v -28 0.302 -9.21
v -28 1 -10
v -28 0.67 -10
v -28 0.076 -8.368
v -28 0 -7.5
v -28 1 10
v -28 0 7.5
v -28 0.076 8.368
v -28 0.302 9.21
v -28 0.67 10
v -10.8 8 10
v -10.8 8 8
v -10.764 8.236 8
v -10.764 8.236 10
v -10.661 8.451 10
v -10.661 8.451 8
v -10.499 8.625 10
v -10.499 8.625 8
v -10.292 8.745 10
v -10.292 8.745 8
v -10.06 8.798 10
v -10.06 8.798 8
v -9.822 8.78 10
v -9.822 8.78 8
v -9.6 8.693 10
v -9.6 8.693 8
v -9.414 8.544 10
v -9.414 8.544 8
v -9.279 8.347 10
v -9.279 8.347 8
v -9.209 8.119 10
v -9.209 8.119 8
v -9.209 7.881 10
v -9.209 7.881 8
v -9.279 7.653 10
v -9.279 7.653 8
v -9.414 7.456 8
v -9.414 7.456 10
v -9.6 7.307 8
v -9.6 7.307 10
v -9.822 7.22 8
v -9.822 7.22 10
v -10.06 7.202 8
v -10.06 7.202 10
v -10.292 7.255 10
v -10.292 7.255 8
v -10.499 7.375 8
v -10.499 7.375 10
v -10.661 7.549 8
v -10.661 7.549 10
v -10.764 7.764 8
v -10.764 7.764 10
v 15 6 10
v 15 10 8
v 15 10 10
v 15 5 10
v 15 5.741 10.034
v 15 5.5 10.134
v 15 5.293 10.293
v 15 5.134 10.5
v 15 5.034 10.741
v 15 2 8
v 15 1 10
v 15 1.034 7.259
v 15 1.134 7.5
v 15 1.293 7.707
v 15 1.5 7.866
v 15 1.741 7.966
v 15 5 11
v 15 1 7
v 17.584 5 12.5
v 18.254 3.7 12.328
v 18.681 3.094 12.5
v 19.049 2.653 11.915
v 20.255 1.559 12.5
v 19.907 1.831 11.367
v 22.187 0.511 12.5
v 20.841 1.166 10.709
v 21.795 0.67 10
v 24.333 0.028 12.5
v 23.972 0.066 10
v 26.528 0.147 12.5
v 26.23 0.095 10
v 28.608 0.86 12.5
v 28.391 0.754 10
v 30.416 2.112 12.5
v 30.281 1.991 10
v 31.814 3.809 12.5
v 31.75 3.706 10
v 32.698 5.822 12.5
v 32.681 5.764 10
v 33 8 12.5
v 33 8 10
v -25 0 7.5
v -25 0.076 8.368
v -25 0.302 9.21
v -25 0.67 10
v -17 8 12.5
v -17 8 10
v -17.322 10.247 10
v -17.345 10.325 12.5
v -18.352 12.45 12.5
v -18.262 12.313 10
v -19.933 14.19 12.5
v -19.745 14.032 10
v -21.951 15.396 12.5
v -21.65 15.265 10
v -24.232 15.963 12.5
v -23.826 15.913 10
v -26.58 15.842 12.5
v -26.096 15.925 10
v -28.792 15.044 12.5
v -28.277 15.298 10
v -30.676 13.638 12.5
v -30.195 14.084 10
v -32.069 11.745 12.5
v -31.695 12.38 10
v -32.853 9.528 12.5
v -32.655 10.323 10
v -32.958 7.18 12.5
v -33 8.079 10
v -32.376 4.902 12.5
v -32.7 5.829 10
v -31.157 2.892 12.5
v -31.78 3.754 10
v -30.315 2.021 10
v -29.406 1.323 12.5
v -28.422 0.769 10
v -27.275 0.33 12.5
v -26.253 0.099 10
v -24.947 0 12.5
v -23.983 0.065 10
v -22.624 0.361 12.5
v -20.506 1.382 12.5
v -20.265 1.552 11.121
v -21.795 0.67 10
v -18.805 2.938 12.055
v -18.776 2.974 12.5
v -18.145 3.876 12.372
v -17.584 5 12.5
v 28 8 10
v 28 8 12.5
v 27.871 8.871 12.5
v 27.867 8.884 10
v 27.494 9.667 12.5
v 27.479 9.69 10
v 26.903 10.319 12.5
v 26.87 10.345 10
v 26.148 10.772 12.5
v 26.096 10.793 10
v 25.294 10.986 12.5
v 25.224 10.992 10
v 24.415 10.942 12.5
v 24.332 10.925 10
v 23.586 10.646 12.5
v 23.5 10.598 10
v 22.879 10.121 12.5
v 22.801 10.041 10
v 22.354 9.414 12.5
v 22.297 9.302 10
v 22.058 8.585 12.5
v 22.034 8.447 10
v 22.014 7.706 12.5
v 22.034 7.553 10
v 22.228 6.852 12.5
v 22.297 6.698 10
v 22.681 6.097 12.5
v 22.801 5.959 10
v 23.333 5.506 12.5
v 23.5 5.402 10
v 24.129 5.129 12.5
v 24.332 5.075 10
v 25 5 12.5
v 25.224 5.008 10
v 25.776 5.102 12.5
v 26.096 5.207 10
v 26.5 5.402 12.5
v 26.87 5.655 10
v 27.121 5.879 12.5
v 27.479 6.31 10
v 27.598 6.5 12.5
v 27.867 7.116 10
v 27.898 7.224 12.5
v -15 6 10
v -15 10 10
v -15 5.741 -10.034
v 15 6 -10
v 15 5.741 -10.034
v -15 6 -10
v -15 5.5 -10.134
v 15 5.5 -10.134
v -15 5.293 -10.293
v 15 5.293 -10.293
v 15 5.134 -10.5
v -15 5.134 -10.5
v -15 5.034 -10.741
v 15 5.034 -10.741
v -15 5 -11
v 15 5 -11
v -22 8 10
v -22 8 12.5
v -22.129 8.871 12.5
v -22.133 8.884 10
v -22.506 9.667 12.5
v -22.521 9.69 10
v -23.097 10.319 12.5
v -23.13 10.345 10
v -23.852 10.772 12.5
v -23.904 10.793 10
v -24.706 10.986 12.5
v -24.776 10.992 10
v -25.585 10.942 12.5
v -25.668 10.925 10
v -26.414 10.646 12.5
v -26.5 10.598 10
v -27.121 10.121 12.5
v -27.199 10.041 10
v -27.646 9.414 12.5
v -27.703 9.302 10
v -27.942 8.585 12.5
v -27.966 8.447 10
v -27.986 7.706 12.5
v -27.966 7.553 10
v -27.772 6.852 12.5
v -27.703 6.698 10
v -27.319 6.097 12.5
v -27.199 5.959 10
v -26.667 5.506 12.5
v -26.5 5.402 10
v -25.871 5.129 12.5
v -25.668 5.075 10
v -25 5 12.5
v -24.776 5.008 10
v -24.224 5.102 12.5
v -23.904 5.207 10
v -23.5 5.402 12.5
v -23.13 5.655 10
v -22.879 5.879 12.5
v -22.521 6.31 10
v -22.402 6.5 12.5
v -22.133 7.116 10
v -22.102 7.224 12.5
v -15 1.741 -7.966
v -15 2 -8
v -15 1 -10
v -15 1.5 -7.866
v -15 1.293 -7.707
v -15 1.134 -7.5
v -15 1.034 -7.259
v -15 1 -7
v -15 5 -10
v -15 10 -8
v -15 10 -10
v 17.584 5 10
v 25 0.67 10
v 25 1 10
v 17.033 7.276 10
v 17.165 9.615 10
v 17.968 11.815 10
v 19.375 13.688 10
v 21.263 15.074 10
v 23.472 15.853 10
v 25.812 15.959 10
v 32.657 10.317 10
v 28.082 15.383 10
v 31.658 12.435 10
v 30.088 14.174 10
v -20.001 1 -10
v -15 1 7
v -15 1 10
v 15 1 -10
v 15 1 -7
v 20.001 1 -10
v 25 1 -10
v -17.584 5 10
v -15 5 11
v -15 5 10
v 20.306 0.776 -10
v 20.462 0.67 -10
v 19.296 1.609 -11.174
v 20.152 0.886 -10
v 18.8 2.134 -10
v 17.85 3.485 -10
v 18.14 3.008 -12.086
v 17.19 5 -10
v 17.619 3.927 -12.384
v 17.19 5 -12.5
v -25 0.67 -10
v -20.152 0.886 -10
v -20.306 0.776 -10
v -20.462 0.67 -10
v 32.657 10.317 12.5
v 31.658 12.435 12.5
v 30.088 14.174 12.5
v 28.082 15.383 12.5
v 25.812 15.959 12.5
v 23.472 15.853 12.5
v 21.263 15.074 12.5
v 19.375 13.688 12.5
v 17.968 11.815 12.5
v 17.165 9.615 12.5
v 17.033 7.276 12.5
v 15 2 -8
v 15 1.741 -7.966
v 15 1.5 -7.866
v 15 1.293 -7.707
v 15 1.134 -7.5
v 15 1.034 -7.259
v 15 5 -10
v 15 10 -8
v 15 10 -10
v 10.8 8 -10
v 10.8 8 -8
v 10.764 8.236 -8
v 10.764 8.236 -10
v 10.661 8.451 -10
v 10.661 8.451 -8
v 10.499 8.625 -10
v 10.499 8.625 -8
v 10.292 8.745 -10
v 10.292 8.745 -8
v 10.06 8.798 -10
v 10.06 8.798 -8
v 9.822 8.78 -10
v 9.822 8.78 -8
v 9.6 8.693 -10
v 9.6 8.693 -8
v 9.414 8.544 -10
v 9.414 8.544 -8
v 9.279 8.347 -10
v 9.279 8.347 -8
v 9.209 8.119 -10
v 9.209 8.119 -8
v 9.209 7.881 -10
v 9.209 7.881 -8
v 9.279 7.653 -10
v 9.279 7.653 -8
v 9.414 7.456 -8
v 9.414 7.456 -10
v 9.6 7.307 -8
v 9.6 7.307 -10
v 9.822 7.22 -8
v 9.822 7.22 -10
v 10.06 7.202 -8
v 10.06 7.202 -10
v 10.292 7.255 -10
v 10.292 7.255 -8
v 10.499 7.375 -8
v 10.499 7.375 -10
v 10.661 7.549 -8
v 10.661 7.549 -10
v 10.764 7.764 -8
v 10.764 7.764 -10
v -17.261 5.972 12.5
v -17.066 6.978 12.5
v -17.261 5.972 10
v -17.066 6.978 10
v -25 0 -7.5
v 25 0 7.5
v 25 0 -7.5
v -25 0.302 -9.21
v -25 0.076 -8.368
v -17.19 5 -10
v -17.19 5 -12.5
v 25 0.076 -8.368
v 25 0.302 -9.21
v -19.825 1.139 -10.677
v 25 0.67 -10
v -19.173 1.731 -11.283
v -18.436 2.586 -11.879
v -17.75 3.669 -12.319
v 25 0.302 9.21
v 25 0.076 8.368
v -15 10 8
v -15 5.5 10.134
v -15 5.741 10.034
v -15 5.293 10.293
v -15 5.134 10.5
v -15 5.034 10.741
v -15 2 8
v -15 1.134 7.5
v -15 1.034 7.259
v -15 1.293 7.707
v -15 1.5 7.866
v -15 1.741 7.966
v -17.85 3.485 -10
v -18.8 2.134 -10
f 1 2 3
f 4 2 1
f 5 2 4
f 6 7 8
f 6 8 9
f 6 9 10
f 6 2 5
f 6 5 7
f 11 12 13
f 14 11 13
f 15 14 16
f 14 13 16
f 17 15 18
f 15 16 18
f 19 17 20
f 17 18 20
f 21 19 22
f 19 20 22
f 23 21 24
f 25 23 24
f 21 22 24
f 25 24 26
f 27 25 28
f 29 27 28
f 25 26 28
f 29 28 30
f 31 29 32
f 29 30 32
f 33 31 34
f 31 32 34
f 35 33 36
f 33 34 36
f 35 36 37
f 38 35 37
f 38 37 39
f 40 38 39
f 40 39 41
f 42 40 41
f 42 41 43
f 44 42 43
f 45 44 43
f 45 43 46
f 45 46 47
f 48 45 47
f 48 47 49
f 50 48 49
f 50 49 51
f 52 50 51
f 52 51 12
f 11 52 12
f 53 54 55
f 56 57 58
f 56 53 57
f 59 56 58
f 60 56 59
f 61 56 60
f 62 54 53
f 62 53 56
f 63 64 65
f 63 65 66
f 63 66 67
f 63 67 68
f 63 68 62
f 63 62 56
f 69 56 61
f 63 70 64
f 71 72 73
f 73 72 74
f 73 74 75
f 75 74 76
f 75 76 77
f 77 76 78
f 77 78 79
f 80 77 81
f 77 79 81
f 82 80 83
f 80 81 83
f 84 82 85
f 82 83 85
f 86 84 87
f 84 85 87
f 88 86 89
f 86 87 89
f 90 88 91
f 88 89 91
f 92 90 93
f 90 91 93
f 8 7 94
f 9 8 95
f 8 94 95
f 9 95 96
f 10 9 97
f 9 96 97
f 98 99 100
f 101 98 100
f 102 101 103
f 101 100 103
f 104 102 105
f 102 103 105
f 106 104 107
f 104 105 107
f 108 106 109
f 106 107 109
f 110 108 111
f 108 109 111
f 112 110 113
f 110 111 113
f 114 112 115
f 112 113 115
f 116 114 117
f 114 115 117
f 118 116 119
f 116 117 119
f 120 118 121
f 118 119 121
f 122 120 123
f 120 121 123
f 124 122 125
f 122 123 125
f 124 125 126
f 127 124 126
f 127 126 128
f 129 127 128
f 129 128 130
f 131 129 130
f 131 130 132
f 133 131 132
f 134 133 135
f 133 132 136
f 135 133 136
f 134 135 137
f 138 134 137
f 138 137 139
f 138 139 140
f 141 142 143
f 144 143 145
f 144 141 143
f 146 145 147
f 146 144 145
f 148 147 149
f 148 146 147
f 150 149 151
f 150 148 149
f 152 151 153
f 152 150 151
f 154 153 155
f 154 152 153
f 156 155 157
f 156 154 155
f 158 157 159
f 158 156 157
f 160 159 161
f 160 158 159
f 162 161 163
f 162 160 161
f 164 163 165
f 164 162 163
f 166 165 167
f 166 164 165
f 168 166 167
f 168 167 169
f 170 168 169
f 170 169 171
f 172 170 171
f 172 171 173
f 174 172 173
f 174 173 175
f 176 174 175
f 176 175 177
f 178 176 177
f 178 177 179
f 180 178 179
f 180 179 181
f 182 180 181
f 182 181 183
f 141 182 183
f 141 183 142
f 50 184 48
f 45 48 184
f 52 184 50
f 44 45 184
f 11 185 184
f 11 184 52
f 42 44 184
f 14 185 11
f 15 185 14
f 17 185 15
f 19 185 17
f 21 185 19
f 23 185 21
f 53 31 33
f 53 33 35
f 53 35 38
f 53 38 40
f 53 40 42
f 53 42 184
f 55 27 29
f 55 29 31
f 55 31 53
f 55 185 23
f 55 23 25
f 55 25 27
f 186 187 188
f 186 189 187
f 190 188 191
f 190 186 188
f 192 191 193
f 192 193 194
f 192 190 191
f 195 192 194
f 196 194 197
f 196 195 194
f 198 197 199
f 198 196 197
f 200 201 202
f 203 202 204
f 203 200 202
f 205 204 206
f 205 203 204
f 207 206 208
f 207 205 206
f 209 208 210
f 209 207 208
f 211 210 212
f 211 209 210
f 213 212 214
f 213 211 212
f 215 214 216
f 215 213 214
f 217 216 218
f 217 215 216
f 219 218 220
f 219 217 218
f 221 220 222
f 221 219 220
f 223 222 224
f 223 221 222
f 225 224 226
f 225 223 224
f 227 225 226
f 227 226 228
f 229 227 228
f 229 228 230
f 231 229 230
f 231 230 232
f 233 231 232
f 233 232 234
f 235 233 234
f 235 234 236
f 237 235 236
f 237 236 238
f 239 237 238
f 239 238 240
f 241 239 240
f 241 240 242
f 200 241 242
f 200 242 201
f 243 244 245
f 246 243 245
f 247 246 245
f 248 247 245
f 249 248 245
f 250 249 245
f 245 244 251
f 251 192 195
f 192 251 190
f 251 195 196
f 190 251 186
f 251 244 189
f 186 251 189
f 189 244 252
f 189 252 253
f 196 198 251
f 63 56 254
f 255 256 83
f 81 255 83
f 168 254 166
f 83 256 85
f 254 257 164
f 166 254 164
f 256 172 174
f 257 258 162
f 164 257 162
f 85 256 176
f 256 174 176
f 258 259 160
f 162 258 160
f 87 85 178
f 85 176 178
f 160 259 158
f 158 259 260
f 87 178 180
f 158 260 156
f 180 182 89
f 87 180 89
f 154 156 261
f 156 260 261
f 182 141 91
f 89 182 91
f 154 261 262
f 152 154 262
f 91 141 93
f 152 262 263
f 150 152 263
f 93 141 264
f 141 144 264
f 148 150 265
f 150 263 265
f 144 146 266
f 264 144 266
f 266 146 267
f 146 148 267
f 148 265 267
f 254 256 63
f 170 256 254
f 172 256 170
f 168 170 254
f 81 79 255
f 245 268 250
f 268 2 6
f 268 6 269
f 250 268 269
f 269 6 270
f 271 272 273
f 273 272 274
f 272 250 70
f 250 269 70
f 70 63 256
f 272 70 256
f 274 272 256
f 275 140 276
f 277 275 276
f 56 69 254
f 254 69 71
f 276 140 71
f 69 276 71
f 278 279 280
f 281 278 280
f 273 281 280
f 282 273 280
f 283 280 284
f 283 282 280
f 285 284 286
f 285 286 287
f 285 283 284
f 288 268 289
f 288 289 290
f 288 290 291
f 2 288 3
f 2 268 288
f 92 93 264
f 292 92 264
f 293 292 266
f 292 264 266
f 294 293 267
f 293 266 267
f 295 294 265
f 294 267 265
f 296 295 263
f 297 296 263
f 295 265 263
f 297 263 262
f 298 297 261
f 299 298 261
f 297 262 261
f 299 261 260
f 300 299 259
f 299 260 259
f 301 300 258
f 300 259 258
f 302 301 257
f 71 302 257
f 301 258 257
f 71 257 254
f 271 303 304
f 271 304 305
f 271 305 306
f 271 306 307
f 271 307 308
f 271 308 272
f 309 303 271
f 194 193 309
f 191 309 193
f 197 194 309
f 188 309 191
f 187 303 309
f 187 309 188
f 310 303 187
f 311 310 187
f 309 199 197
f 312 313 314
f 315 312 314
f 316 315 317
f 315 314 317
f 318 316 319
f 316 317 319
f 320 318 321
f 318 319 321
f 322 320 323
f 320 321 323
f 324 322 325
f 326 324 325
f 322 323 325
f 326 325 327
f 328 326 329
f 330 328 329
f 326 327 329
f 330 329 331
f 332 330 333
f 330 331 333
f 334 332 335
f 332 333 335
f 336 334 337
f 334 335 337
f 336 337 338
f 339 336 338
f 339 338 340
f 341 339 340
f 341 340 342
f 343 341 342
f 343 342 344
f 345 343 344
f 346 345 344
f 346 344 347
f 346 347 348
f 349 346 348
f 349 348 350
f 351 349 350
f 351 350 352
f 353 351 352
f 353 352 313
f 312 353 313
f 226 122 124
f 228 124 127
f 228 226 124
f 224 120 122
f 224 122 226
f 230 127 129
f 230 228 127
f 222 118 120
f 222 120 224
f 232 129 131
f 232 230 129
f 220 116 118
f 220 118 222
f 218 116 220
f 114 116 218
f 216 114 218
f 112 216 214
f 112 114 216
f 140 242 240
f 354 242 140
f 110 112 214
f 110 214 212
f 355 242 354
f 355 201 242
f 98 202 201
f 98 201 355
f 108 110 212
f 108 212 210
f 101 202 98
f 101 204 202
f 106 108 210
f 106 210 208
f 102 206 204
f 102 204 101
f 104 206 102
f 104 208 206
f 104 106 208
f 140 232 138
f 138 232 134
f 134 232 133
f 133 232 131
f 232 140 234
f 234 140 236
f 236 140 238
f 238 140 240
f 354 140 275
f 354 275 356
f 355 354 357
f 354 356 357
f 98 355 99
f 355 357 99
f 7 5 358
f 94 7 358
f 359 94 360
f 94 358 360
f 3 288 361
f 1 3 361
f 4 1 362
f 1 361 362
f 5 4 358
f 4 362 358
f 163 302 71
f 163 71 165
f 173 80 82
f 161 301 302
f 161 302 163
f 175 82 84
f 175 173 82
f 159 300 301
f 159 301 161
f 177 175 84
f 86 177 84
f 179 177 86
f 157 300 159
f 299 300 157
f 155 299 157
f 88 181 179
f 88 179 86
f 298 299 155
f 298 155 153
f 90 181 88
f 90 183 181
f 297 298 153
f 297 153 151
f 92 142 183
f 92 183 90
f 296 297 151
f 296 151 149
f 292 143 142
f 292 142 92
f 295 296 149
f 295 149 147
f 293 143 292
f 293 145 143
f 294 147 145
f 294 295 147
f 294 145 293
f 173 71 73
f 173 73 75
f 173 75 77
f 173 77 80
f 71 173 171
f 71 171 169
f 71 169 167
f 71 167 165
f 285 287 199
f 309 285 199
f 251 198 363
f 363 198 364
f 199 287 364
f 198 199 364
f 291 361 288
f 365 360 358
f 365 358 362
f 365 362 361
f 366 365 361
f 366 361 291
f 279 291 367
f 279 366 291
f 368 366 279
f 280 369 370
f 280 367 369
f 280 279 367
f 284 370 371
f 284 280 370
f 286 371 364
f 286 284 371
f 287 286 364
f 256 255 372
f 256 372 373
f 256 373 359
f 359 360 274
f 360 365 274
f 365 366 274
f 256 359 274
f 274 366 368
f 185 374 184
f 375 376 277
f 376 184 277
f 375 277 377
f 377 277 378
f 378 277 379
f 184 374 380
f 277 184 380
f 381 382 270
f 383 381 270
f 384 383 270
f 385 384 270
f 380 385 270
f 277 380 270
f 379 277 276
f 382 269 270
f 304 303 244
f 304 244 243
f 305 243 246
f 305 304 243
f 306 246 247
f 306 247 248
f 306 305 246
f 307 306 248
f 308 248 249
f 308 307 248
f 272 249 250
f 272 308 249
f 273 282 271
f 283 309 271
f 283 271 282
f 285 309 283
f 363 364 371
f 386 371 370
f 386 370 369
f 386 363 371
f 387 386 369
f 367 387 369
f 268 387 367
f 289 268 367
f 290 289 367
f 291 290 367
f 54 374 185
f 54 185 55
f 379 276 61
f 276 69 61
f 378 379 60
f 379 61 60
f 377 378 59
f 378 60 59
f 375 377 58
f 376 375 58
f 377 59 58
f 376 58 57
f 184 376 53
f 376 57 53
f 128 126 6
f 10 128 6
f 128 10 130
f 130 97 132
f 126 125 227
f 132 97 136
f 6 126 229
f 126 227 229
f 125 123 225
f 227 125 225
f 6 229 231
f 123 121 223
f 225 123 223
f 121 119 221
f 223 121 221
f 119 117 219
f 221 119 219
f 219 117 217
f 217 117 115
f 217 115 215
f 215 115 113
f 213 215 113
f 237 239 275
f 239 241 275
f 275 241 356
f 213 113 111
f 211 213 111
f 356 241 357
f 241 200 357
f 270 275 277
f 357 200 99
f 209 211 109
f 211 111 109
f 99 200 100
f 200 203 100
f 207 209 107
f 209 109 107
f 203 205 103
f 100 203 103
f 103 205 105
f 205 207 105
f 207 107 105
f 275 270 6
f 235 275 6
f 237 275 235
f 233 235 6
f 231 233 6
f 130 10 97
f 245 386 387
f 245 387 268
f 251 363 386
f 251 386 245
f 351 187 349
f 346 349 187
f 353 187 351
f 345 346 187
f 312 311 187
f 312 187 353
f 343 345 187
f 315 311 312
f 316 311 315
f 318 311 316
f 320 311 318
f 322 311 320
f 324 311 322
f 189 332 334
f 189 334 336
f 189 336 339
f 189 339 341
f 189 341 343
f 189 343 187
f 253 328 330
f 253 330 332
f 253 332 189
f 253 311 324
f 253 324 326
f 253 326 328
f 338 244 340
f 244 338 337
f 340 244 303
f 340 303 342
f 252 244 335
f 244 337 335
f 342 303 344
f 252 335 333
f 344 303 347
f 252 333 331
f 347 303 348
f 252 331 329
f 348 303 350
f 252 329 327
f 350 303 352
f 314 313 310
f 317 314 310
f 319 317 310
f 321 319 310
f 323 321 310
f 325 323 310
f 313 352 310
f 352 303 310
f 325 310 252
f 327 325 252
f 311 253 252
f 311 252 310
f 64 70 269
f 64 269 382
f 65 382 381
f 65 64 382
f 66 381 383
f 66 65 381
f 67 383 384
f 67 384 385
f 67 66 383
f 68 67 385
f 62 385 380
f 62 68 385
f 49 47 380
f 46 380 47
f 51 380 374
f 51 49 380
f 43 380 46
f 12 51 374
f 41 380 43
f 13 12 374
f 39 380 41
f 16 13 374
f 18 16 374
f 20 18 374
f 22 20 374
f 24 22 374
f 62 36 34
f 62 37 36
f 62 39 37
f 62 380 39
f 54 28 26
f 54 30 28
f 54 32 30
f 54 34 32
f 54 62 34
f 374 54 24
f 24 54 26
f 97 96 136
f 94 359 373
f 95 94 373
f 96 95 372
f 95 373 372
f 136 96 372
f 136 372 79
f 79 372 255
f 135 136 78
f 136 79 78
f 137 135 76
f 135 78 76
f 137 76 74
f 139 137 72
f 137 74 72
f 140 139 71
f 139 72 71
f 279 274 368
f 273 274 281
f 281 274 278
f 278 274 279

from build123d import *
from build123d.topology import SkipClean

# Parameters (mm, degrees)
SKETCH_1_W               = 50
SKETCH_1_H               = 25
EXTRUDE_1_DEPTH          = 10
CUT_EXTRUDE_1_REACH      = 54.5
SKETCH_3_W               = 16
SKETCH_3_H               = 9
CUT_EXTRUDE_2_DEPTH      = 53.5
SKETCH_14_W              = 50
SKETCH_14_H              = 5
CUT_EXTRUDE_5_DEPTH      = 2.5
SKETCH_15_W              = 50
SKETCH_15_H              = 5
CUT_EXTRUDE_6_DEPTH      = 2.5
HOLE_WIZARD_M2_1_D       = 1.6
HOLE_WIZARD_M2_1_DEPTH   = 2
HOLE_WIZARD_M2_2_D       = 1.6
HOLE_WIZARD_M2_2_DEPTH   = 2
SKETCH_19_W              = 10
SKETCH_19_H              = 9
CUT_EXTRUDE_10_DEPTH     = 2
SKETCH_21_R              = 8
EXTRUDE_5_DEPTH          = 2.5
SKETCH_22_W              = 10
SKETCH_22_H              = 9
CUT_EXTRUDE_12_DEPTH     = 2
CUT_EXTRUDE_START        = -2.5
CUT_EXTRUDE_13_OUTLINE_R = 3
CUT_EXTRUDE_13_DEPTH     = 2.5
SKETCH_17_R              = 8.2
CUT_EXTRUDE_15_DEPTH     = 10
EXTRUDE_6_DEPTH          = 3
FILLET_1_R               = 1
FILLET_2_R               = 1


# Read off the part's stored shape, not the designer's step: 切除-拉伸13
with BuildPart() as part:
    # 草图1 → 凸台-拉伸1 (new body)
    with BuildSketch(Plane(origin=(0, 0, 0), x_dir=(1, 0, 0), z_dir=(0, 1, 0))):
        Rectangle(SKETCH_1_W, SKETCH_1_H)
    extrude(amount=EXTRUDE_1_DEPTH)

    # 草图2 → 切除-拉伸1 (cut, up to next)
    with BuildSketch(Plane(origin=(25, 0, 0), x_dir=(0, 0, -1), z_dir=(1, 0, 0)), mode=Mode.PRIVATE) as cut_extrude_1_sk1:
        with BuildLine():
            Line((-12.5, 0), (-7.5, 0))
            ThreePointArc((-7.5, 0), (-11.035533906, 1.464466094), (-12.5, 5))
            Line((-12.5, 5), (-12.5, 0))
        make_face()
    cut_extrude_1_tool1 = extrude(cut_extrude_1_sk1.sketch, amount=-CUT_EXTRUDE_1_REACH, mode=Mode.PRIVATE) & part.part
    # 草图2 → 切除-拉伸1 (cut, up to next)
    with BuildSketch(Plane(origin=(25, 0, 0), x_dir=(0, 0, -1), z_dir=(1, 0, 0)), mode=Mode.PRIVATE) as cut_extrude_1_sk2:
        with BuildLine():
            Line((12.5, 5), (12.5, 0))
            Line((12.5, 0), (7.5, 0))
            ThreePointArc((7.5, 0), (11.035533906, 1.464466094), (12.5, 5))
        make_face()
    cut_extrude_1_tool2 = extrude(cut_extrude_1_sk2.sketch, amount=-CUT_EXTRUDE_1_REACH, mode=Mode.PRIVATE) & part.part
    add(cut_extrude_1_tool1.solids().sort_by_distance((25, 1.11684, 11.38316))[0], mode=Mode.SUBTRACT)
    add(cut_extrude_1_tool2.solids().sort_by_distance((25, 1.11684, -11.38316))[0], mode=Mode.SUBTRACT)

    # 草图3 → 切除-拉伸2 (cut, through all)
    with BuildSketch(Plane(origin=(25, 0, 0), x_dir=(0, 0, -1), z_dir=(1, 0, 0))):
        with Locations((0, 5.5)):
            Rectangle(SKETCH_3_W, SKETCH_3_H)
    extrude(amount=-CUT_EXTRUDE_2_DEPTH, mode=Mode.SUBTRACT)

    # 草图14 → 切除-拉伸5 (cut)
    with BuildSketch(Plane(origin=(0, 0, -12.5), x_dir=(-1, 0, 0), z_dir=(0, 0, -1))):
        with Locations((0, 7.5)):
            Rectangle(SKETCH_14_W, SKETCH_14_H)
    extrude(amount=-CUT_EXTRUDE_5_DEPTH, mode=Mode.SUBTRACT)

    # 草图15 → 切除-拉伸6 (cut)
    with BuildSketch(Plane.XY.offset(12.5)):
        with Locations((0, 7.5)):
            Rectangle(SKETCH_15_W, SKETCH_15_H)
    extrude(amount=-CUT_EXTRUDE_6_DEPTH, mode=Mode.SUBTRACT)

    # M2 螺纹孔1
    with Locations(Plane(origin=(0, 0, -10), x_dir=(-1, 0, 0), z_dir=(0, 0, -1))):
        with Locations((-10, 8)):
            Hole(HOLE_WIZARD_M2_1_D / 2, depth=HOLE_WIZARD_M2_1_DEPTH)

    # M2 螺纹孔2
    with Locations(Plane.XY.offset(10)):
        with Locations((-10, 8)):
            Hole(HOLE_WIZARD_M2_2_D / 2, depth=HOLE_WIZARD_M2_2_DEPTH)

    # 草图19 → 切除-拉伸10 (cut)
    with BuildSketch(Plane.XY.offset(-8)):
        with Locations((-20, 5.5)):
            Rectangle(SKETCH_19_W, SKETCH_19_H)
        with Locations((20, 5.5)):
            Rectangle(SKETCH_19_W, SKETCH_19_H)
    extrude(amount=-CUT_EXTRUDE_10_DEPTH, mode=Mode.SUBTRACT)

    # 草图21 → 凸台-拉伸5 (add)
    with SkipClean():  # the faces are left unmerged after this step: merging them gives an invalid solid
        with BuildSketch(Plane.XY.offset(10)):
            with Locations((25, 8)):
                Circle(SKETCH_21_R)
            with Locations((-25, 8)):
                Circle(SKETCH_21_R)
        extrude(amount=EXTRUDE_5_DEPTH)

    # 草图22 → 切除-拉伸12 (cut)
    with SkipClean():  # the faces are left unmerged after this step: merging them gives an invalid solid
        with BuildSketch(Plane.XY.offset(10)):
            with Locations((-20, 5.5)):
                Rectangle(SKETCH_22_W, SKETCH_22_H)
            with Locations((20, 5.5)):
                Rectangle(SKETCH_22_W, SKETCH_22_H)
        extrude(amount=-CUT_EXTRUDE_12_DEPTH, mode=Mode.SUBTRACT)

    # 切除-拉伸13 outline → 切除-拉伸13 (cut)
    with SkipClean():  # the faces are left unmerged after this step: merging them gives an invalid solid
        with BuildSketch(Plane.XY.offset(12.5).offset(CUT_EXTRUDE_START)):
            with Locations((25, 8)):
                Circle(CUT_EXTRUDE_13_OUTLINE_R)
            with Locations((-25, 8)):
                Circle(CUT_EXTRUDE_13_OUTLINE_R)
        extrude(amount=CUT_EXTRUDE_13_DEPTH, mode=Mode.SUBTRACT)

    # 草图17 → 切除-拉伸15 (cut)
    with SkipClean():  # the faces are left unmerged after this step: merging them gives an invalid solid
        with BuildSketch(Plane(origin=(0, 0, -10), x_dir=(-1, 0, 0), z_dir=(0, 0, -1))):
            with Locations((-25, 7.5)):
                Circle(SKETCH_17_R)
            with Locations((25, 7.5)):
                Circle(SKETCH_17_R)
        extrude(amount=CUT_EXTRUDE_15_DEPTH, mode=Mode.SUBTRACT)

    # 草图24 → 凸台-拉伸6 (add)
    with SkipClean():  # the faces are left unmerged after this step: merging them gives an invalid solid
        with BuildSketch(Plane.ZY.offset(25)):
            with BuildLine():
                Line((10, 1), (-10, 1))
                Line((-10, 1), (-10, 0.669872981))
                ThreePointArc((-10, 0.669872981), (-8.794095226, 0.170370869), (-7.5, 0))
                Line((-7.5, 0), (7.5, 0))
                ThreePointArc((7.5, 0), (8.794095226, 0.170370869), (10, 0.669872981))
                Line((10, 0.669872981), (10, 1))
            make_face()
        extrude(amount=EXTRUDE_6_DEPTH)

    # 圆角1
    # the kernel refuses this fillet: 1 mm, written as the material it adds along each edge
    with BuildSketch(Plane(origin=(15, 1, 8), x_dir=(0, 0, -1), z_dir=(-1, 0, 0))) as fillet_1_piece_1:
        with BuildLine():
            CenterArc((FILLET_1_R, -FILLET_1_R), FILLET_1_R, 90, 90)
            Line((0, -FILLET_1_R), (0, 0))
            Line((0, 0), (FILLET_1_R, 0))
        make_face()
    extrude(amount=30)
    with BuildSketch(Plane(origin=(15, 1, -8), x_dir=(0, 0, 1), z_dir=(-1, 0, 0))) as fillet_1_piece_2:
        with BuildLine():
            CenterArc((FILLET_1_R, FILLET_1_R), FILLET_1_R, 180, 90)
            Line((0, FILLET_1_R), (0, 0))
            Line((0, 0), (FILLET_1_R, 0))
        make_face()
    extrude(amount=30)

    # 圆角2
    fillet_2_edges = [part.edges().sort_by_distance(p)[0] for p in [
        (0, 5, -10),
        (0, 5, 10),
    ]]
    fillet(fillet_2_edges, radius=FILLET_2_R)


solid = part.part
